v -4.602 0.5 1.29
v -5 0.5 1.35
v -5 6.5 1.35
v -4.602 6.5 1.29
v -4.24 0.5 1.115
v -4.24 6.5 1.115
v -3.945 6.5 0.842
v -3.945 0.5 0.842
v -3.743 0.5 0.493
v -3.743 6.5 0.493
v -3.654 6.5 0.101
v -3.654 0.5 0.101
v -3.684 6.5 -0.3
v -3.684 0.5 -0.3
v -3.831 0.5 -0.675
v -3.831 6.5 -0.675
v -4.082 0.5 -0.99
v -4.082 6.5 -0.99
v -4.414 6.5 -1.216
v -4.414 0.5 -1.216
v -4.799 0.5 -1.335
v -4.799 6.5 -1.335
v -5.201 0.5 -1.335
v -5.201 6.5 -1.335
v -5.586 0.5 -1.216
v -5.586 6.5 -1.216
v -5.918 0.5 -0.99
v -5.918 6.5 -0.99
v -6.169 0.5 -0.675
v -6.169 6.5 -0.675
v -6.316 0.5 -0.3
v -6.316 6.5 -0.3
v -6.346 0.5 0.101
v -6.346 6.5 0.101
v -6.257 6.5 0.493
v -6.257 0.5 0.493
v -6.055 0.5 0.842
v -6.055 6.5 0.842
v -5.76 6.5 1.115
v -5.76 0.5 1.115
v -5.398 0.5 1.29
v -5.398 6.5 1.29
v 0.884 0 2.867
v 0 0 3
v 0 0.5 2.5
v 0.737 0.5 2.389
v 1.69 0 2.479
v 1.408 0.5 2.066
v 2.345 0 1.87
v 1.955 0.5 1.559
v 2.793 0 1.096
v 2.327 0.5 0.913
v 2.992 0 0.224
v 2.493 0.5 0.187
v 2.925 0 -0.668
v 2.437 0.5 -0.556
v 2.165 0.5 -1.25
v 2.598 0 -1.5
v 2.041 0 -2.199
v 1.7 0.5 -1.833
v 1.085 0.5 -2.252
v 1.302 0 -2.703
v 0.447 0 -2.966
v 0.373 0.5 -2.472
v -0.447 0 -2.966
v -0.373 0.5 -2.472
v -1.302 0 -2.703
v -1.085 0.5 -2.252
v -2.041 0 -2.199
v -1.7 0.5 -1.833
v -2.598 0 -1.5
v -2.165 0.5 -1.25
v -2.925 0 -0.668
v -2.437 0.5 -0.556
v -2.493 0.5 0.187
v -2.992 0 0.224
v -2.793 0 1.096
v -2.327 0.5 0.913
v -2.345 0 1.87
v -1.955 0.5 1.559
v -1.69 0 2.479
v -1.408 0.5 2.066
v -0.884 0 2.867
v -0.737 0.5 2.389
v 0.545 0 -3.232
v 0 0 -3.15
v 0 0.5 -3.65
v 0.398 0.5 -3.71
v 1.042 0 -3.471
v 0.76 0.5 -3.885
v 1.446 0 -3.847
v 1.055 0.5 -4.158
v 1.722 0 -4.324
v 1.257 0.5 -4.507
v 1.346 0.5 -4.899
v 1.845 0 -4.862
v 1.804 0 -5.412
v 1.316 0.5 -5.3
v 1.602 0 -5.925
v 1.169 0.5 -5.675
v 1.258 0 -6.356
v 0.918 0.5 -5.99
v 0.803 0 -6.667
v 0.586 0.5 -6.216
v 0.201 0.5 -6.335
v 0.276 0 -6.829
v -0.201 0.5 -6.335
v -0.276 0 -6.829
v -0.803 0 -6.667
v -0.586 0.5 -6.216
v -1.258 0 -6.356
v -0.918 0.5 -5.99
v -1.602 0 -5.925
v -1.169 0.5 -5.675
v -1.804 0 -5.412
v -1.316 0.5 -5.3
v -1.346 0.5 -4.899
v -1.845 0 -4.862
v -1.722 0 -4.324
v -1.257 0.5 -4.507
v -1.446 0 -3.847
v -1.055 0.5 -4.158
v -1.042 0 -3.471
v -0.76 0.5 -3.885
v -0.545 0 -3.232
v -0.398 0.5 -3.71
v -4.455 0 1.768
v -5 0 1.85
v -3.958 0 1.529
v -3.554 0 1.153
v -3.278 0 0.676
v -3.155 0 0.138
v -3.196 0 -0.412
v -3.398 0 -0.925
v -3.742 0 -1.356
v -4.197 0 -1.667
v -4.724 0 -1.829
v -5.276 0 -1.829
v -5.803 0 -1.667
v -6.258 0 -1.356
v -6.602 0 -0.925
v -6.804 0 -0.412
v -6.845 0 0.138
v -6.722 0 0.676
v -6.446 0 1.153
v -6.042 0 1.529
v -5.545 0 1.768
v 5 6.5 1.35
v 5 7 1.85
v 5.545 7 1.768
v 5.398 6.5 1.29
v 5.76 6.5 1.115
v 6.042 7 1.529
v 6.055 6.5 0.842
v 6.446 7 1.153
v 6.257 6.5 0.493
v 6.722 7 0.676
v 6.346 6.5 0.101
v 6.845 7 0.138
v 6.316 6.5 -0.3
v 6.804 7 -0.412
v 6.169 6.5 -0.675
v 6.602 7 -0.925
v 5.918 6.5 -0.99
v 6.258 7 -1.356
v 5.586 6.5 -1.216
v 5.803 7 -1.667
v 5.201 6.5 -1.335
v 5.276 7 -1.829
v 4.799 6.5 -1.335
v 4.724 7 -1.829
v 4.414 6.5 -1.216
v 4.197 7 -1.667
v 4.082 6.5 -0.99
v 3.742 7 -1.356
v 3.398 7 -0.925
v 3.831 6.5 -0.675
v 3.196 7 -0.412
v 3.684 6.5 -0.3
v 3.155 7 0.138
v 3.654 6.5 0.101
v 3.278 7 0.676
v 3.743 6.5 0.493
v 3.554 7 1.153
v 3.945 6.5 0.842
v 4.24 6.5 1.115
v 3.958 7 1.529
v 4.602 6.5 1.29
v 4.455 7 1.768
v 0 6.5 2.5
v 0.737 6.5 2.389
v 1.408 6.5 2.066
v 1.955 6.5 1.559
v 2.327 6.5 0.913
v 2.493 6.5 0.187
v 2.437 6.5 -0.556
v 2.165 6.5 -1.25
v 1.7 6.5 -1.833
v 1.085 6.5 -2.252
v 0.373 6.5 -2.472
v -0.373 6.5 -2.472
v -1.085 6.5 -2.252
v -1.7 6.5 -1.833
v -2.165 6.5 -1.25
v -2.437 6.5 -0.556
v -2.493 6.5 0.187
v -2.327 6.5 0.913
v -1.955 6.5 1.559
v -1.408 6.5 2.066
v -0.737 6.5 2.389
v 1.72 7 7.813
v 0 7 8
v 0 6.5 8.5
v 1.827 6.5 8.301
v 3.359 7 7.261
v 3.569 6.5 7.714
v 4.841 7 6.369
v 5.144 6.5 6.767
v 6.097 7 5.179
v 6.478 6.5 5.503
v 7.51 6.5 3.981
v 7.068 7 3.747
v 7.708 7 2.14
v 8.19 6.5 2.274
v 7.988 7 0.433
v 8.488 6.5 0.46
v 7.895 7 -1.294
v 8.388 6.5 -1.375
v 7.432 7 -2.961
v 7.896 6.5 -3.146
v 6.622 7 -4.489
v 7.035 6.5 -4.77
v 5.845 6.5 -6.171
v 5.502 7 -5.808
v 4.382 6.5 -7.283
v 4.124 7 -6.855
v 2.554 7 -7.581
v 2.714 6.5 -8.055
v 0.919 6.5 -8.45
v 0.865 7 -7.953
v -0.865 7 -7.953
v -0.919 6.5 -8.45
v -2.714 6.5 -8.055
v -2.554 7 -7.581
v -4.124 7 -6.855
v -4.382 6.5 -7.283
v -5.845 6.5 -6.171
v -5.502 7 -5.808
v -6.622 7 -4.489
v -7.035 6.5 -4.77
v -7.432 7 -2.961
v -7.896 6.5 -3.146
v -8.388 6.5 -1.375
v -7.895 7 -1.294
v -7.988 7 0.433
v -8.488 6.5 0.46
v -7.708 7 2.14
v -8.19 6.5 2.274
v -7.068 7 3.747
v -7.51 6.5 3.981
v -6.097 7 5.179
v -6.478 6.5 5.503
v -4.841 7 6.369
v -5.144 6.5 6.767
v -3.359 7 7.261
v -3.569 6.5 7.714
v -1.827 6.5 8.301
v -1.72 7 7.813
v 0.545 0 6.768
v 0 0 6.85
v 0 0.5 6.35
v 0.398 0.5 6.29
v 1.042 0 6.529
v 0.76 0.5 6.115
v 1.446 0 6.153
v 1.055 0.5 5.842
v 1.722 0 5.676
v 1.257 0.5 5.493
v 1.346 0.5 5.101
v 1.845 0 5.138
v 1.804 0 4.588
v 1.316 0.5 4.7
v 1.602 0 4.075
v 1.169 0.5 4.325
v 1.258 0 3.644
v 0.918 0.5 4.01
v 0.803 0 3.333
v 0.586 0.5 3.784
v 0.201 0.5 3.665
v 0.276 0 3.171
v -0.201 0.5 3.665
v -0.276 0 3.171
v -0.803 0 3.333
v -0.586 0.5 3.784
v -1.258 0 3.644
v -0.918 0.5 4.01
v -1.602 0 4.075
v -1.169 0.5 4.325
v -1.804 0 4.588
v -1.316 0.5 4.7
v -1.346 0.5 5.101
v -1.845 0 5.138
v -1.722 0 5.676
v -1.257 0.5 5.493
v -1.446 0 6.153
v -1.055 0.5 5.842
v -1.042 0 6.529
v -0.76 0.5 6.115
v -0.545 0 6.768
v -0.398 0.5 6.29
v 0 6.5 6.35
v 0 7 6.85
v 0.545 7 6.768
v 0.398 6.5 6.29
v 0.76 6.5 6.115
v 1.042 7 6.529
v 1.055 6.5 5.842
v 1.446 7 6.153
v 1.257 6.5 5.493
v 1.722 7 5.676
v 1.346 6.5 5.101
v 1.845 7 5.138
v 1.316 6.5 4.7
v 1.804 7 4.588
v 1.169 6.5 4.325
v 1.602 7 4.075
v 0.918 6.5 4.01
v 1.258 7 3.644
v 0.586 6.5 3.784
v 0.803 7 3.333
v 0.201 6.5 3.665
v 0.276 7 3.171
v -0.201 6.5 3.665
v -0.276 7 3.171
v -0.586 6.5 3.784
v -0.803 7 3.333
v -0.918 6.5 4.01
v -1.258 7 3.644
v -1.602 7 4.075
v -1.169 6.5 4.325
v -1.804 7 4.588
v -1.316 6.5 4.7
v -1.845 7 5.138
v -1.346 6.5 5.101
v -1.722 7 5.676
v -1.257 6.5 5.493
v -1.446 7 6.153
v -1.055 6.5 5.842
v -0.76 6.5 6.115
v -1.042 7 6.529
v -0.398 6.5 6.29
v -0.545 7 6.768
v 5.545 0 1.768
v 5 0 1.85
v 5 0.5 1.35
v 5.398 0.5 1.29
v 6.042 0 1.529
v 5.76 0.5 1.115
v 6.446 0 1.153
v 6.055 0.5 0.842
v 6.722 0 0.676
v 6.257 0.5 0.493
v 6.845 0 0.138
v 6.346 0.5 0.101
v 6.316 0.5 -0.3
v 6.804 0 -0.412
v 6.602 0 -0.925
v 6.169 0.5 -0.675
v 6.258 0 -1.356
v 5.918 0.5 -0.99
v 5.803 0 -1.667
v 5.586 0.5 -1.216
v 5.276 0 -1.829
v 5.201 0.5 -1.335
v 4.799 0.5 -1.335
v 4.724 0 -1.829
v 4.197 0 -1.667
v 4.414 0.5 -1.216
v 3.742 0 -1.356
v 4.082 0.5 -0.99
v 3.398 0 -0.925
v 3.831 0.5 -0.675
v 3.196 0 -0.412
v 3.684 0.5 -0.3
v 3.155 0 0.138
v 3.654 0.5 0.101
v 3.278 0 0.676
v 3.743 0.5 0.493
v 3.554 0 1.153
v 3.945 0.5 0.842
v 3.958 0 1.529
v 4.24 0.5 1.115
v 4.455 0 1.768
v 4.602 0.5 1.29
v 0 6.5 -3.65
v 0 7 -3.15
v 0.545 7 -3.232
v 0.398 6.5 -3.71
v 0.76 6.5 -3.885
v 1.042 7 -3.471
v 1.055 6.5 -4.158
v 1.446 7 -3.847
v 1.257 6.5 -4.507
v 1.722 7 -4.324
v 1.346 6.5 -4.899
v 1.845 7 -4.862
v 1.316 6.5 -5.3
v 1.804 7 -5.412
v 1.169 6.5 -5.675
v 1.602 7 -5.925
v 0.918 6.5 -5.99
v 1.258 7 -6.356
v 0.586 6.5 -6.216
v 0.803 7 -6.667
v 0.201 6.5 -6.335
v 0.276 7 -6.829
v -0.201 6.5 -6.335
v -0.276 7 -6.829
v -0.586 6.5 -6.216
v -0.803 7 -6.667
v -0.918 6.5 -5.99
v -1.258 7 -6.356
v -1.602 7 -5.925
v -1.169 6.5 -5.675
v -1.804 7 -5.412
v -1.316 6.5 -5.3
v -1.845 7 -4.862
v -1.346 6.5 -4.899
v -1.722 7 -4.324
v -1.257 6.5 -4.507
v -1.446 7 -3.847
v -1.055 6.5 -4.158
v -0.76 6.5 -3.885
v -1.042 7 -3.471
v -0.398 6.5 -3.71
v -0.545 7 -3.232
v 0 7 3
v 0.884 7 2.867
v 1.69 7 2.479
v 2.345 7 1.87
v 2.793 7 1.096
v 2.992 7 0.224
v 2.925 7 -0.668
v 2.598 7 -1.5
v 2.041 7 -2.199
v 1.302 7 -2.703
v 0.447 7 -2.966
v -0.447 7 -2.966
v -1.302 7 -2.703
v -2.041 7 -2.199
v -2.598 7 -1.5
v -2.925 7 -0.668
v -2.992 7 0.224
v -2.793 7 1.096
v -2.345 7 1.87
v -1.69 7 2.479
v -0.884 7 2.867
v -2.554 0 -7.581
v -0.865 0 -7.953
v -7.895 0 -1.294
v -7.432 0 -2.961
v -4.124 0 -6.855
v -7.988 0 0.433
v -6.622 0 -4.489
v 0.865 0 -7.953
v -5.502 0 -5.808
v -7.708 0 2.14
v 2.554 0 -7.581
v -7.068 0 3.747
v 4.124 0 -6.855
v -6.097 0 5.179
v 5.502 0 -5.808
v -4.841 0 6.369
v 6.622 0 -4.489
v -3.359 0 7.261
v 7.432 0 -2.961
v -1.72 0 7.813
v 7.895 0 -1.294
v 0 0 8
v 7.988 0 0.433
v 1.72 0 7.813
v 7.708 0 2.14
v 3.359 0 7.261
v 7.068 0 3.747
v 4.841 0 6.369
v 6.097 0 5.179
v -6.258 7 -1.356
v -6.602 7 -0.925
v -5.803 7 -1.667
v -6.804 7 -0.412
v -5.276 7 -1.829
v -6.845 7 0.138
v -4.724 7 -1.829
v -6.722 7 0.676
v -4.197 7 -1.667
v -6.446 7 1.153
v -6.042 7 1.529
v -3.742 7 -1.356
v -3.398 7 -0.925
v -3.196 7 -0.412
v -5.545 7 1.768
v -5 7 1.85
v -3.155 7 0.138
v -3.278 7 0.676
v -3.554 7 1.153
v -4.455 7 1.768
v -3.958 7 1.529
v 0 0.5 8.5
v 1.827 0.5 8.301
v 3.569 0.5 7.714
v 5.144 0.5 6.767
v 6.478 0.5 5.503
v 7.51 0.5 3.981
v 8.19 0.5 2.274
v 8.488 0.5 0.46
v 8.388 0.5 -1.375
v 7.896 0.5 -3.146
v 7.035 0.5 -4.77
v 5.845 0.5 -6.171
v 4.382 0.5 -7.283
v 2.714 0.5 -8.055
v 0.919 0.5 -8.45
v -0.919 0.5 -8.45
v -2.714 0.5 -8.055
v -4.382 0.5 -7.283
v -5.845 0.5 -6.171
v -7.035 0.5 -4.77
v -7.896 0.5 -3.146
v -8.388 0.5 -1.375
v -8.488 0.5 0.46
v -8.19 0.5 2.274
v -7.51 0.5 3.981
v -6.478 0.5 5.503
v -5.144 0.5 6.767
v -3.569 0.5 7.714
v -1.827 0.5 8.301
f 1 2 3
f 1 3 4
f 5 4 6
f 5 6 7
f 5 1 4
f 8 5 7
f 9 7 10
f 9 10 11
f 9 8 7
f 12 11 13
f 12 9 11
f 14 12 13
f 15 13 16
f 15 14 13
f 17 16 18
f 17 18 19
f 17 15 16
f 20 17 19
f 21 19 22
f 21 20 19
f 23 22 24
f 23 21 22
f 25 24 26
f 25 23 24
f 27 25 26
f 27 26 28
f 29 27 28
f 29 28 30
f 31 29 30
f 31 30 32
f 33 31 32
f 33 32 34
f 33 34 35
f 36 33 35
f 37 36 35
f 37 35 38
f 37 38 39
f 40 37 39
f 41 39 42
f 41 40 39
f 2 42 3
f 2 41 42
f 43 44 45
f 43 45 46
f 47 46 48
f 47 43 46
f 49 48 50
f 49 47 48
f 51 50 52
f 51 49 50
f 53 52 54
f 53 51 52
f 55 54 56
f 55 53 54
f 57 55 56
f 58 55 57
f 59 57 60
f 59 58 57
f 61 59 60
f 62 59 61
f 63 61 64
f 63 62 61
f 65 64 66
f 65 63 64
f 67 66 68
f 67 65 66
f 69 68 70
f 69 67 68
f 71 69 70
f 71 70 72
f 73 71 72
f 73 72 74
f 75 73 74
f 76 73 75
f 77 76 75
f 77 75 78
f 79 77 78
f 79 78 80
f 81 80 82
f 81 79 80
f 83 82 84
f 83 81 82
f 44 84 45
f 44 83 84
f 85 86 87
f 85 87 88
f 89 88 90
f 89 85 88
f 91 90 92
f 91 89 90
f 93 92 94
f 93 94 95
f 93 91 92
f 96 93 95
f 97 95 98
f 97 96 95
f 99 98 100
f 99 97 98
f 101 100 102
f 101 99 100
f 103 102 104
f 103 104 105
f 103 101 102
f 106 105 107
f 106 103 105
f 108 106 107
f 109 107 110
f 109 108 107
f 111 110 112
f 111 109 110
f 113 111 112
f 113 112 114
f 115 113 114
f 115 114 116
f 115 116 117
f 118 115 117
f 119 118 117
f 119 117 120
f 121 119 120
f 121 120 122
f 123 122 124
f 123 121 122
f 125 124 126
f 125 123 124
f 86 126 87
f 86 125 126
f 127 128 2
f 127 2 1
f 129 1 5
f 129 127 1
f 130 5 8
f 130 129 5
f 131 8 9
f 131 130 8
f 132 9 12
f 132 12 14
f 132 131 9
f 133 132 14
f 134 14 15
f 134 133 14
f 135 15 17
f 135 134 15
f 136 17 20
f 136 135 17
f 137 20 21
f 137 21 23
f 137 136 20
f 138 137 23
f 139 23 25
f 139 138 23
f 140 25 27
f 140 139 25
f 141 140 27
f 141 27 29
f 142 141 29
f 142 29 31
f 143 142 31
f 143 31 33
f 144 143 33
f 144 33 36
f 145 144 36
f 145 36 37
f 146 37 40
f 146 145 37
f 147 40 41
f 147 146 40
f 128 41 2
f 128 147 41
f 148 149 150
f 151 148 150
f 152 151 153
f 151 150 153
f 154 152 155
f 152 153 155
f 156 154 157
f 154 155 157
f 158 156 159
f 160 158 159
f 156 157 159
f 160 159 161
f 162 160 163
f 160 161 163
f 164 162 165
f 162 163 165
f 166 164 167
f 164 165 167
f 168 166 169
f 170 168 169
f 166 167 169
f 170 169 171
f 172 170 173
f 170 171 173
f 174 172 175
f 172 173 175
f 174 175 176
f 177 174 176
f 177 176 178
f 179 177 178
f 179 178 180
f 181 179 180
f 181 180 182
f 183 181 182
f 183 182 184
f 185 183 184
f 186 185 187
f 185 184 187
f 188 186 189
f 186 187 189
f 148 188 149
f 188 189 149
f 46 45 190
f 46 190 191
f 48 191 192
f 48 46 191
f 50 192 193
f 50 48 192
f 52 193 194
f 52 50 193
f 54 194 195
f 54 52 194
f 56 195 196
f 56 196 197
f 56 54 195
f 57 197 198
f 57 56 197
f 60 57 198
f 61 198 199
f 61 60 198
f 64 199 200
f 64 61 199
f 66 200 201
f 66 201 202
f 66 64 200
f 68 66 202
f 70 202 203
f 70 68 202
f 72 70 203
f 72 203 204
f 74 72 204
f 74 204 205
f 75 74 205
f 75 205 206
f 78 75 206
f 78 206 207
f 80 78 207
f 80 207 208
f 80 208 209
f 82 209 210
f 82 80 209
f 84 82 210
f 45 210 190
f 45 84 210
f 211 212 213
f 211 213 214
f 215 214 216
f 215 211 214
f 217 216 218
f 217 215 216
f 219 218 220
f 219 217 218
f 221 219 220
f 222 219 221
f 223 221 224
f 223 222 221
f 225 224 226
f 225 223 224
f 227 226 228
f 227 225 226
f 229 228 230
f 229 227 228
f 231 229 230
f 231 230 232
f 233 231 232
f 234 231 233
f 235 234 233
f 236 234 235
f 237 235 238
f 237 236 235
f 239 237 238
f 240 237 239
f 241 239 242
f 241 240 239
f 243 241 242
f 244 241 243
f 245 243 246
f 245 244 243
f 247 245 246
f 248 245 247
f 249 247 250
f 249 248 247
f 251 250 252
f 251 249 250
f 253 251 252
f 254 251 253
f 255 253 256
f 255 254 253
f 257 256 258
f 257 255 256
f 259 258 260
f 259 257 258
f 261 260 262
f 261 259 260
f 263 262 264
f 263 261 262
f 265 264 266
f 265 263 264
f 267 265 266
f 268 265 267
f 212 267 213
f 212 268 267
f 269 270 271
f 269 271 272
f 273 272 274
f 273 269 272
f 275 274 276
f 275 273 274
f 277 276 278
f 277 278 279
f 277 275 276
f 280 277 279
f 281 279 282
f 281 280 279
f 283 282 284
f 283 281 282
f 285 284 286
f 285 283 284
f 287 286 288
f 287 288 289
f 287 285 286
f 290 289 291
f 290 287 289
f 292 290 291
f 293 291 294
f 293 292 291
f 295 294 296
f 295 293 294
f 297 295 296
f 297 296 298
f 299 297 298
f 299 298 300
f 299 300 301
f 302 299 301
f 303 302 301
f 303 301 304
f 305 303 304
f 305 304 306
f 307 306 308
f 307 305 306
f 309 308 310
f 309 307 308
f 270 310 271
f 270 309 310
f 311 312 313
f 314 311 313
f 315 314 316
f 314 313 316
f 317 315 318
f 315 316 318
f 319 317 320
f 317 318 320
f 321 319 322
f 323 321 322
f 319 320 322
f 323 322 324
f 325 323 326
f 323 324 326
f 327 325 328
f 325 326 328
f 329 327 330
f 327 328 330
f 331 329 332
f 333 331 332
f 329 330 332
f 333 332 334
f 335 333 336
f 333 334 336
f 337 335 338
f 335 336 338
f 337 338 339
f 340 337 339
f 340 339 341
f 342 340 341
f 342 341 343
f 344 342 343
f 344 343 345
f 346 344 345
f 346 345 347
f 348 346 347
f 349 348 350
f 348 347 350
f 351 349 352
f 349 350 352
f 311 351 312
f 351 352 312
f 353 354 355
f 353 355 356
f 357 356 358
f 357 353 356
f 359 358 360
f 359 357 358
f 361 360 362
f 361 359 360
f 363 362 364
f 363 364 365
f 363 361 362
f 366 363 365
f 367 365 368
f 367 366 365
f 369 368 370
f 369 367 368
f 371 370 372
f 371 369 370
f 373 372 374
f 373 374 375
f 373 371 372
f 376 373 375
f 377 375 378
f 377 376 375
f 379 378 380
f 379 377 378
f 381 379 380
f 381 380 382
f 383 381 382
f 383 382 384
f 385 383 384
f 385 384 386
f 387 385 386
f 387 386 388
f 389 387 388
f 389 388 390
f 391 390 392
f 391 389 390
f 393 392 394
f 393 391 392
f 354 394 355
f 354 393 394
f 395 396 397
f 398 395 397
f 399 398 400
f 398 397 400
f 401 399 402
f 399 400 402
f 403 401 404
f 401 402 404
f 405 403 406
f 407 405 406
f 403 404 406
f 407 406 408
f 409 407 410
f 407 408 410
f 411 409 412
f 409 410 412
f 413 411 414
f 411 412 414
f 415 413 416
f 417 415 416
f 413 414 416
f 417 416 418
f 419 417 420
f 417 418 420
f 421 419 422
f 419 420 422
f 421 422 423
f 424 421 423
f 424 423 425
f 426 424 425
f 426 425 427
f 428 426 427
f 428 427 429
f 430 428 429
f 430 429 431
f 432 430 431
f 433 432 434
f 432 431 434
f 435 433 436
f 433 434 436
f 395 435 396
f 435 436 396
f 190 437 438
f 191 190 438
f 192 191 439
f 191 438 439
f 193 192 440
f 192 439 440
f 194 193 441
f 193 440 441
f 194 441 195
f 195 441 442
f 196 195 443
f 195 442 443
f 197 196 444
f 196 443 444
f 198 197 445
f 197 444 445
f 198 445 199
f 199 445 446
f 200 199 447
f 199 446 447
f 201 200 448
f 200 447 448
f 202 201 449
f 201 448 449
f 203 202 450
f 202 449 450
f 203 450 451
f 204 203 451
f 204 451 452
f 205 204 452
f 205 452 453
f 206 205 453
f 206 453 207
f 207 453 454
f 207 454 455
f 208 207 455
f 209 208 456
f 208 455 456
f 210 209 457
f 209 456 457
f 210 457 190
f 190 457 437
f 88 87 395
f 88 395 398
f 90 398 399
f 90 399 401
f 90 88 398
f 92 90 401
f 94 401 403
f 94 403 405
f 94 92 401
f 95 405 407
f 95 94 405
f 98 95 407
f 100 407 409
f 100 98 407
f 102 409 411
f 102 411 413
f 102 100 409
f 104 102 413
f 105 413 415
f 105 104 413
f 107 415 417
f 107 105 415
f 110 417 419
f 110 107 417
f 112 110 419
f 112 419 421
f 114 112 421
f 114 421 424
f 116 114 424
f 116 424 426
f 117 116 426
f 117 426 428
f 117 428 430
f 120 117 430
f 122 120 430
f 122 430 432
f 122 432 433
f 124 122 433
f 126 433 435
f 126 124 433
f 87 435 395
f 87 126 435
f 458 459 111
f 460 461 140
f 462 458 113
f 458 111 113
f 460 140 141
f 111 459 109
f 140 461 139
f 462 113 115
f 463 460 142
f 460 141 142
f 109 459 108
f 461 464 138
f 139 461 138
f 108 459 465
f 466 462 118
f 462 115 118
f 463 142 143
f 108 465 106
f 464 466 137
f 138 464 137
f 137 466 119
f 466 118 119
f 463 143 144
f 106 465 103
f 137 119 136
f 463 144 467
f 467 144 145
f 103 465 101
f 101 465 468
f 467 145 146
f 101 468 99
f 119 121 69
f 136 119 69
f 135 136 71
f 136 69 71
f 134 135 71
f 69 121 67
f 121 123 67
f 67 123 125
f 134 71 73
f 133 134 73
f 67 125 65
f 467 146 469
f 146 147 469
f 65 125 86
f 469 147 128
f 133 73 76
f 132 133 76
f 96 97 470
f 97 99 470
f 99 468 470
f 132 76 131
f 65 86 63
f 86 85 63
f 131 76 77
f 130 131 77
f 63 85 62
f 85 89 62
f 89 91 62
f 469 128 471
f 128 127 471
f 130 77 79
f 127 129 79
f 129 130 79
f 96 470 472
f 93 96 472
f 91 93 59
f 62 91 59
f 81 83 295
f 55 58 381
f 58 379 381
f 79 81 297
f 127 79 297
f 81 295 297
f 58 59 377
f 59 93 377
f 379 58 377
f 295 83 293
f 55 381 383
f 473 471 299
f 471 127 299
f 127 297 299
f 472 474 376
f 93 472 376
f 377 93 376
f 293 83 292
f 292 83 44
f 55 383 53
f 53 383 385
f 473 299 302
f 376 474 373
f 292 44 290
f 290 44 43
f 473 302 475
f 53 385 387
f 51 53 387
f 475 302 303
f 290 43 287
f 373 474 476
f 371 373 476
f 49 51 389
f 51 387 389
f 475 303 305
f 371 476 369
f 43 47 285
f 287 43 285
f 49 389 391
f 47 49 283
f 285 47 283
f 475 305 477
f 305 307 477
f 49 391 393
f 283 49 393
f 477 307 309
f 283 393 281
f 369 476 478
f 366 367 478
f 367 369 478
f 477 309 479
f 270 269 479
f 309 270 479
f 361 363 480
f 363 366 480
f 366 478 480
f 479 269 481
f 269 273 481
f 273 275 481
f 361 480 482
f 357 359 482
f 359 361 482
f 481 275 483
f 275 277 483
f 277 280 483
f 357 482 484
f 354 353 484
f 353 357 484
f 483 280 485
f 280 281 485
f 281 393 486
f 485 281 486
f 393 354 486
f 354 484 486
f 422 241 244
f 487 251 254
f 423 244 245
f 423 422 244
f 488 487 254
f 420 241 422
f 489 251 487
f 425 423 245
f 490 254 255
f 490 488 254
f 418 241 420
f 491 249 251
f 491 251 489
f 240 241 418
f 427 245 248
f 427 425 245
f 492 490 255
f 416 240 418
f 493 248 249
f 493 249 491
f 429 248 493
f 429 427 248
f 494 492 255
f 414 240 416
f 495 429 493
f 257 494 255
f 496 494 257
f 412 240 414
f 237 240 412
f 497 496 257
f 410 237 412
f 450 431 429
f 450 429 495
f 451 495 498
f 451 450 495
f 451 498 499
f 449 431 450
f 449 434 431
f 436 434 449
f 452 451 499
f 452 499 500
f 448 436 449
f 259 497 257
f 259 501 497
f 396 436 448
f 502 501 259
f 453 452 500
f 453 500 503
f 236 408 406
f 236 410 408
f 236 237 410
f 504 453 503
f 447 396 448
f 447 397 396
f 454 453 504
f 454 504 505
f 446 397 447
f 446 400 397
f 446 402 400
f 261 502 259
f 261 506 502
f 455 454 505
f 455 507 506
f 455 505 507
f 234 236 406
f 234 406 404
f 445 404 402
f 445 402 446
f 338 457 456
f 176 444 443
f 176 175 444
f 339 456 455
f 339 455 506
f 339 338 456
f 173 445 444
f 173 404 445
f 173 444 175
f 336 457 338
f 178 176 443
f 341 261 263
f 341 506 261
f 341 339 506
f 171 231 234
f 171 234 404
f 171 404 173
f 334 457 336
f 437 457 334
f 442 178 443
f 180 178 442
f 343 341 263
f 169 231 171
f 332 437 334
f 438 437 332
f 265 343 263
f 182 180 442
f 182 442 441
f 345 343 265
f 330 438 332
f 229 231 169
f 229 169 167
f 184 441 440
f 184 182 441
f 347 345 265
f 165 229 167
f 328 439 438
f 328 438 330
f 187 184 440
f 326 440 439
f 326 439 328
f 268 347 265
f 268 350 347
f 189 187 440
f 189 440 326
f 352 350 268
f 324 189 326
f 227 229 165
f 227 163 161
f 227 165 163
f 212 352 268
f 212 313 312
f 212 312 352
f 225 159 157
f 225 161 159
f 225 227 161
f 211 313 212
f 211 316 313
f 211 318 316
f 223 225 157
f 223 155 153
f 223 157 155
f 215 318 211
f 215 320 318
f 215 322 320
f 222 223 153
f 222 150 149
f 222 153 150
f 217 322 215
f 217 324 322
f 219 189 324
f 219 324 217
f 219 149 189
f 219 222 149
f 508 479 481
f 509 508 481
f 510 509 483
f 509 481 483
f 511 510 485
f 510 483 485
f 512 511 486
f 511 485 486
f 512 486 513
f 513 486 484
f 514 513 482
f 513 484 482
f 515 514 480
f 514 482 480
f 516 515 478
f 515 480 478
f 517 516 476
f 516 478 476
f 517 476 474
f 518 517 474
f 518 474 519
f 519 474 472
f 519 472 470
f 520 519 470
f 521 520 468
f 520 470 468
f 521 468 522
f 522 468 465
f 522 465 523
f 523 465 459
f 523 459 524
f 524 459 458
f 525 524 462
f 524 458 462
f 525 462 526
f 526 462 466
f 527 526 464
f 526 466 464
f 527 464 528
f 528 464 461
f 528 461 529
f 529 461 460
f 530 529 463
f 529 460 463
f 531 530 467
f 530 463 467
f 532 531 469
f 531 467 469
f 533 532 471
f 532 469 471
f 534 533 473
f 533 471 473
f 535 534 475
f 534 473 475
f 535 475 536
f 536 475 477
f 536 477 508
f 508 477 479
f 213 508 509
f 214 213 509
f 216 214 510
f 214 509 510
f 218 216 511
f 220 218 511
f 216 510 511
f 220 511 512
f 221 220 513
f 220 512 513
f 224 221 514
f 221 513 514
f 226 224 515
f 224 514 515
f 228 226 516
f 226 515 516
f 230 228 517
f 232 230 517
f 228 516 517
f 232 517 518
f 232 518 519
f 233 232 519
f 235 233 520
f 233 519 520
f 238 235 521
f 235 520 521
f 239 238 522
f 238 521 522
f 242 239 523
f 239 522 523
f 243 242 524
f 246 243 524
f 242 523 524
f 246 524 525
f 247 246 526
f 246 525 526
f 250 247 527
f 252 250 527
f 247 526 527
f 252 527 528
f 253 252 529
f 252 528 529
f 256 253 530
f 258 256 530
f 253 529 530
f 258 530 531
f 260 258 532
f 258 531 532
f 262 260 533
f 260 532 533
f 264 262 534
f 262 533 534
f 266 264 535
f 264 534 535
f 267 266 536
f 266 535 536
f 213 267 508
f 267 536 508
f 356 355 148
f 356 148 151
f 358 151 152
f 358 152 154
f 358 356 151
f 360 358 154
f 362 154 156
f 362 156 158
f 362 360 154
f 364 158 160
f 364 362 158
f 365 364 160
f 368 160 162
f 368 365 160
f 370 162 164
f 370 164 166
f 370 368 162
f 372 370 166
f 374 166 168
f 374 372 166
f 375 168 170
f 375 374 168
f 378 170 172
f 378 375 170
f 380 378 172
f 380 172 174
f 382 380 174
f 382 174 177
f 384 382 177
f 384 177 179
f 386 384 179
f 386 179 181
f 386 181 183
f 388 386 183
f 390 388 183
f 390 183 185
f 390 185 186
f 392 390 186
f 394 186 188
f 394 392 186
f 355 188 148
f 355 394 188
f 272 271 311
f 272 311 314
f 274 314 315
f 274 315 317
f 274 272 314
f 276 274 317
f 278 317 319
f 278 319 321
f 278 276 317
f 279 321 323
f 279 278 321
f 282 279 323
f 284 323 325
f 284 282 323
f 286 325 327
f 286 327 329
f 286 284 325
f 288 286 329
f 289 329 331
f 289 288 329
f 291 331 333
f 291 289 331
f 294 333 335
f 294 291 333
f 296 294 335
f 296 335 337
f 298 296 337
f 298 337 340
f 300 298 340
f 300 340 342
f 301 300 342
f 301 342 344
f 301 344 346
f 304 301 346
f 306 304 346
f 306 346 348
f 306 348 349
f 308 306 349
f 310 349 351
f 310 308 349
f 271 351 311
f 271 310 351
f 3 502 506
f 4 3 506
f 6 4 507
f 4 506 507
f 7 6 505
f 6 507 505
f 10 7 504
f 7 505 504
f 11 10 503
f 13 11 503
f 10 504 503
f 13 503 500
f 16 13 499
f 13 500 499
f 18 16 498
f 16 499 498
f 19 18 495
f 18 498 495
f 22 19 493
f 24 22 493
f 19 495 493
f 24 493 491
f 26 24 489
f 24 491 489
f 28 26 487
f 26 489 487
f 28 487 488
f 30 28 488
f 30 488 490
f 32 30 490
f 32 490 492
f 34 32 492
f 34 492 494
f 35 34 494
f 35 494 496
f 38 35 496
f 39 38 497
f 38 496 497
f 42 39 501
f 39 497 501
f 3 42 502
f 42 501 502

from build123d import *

# Parameters (mm, degrees)
SKETCH_1_R      = 8.5
SKETCH_1_R_2    = 1.35
SKETCH_1_R_3    = 2.5
EXTRUDE_1_DEPTH = 7
CHAMFER_1_SIZE  = 0.5


with BuildPart() as part:
    # 草图1 → 凸台-拉伸1 (new body)
    with BuildSketch(Plane(origin=(0, 0, 0), x_dir=(1, 0, 0), z_dir=(0, 1, 0))):
        with Locations(Location((0, 0, 0), (0, 0, 270))):
            Circle(SKETCH_1_R)
        with Locations(Location((-5, 0, 0), (0, 0, 270))):
            Circle(SKETCH_1_R_2, mode=Mode.SUBTRACT)
        with Locations(Location((0, 5, 0), (0, 0, 270))):
            Circle(SKETCH_1_R_2, mode=Mode.SUBTRACT)
        with Locations(Location((5, 0, 0), (0, 0, 270))):
            Circle(SKETCH_1_R_2, mode=Mode.SUBTRACT)
        with Locations(Location((0, -5, 0), (0, 0, 270))):
            Circle(SKETCH_1_R_2, mode=Mode.SUBTRACT)
        with Locations(Location((0, 0, 0), (0, 0, 270))):
            Circle(SKETCH_1_R_3, mode=Mode.SUBTRACT)
    extrude(amount=EXTRUDE_1_DEPTH)

    # 倒角1
    chamfer_1_edges = [part.edges().sort_by_distance(p)[0] for p in [
        (0, 0, -6.35),
        (0, 7, -6.35),
        (5, 0, -1.35),
        (5, 7, -1.35),
        (0, 0, -8.5),
        (0, 0, 3.65),
        (0, 7, 3.65),
        (0, 7, -8.5),
        (-5, 0, -1.35),
        (-5, 7, -1.35),
        (0, 0, -2.5),
        (0, 7, -2.5),
    ]]
    chamfer(chamfer_1_edges, length=CHAMFER_1_SIZE)


solid = part.part
